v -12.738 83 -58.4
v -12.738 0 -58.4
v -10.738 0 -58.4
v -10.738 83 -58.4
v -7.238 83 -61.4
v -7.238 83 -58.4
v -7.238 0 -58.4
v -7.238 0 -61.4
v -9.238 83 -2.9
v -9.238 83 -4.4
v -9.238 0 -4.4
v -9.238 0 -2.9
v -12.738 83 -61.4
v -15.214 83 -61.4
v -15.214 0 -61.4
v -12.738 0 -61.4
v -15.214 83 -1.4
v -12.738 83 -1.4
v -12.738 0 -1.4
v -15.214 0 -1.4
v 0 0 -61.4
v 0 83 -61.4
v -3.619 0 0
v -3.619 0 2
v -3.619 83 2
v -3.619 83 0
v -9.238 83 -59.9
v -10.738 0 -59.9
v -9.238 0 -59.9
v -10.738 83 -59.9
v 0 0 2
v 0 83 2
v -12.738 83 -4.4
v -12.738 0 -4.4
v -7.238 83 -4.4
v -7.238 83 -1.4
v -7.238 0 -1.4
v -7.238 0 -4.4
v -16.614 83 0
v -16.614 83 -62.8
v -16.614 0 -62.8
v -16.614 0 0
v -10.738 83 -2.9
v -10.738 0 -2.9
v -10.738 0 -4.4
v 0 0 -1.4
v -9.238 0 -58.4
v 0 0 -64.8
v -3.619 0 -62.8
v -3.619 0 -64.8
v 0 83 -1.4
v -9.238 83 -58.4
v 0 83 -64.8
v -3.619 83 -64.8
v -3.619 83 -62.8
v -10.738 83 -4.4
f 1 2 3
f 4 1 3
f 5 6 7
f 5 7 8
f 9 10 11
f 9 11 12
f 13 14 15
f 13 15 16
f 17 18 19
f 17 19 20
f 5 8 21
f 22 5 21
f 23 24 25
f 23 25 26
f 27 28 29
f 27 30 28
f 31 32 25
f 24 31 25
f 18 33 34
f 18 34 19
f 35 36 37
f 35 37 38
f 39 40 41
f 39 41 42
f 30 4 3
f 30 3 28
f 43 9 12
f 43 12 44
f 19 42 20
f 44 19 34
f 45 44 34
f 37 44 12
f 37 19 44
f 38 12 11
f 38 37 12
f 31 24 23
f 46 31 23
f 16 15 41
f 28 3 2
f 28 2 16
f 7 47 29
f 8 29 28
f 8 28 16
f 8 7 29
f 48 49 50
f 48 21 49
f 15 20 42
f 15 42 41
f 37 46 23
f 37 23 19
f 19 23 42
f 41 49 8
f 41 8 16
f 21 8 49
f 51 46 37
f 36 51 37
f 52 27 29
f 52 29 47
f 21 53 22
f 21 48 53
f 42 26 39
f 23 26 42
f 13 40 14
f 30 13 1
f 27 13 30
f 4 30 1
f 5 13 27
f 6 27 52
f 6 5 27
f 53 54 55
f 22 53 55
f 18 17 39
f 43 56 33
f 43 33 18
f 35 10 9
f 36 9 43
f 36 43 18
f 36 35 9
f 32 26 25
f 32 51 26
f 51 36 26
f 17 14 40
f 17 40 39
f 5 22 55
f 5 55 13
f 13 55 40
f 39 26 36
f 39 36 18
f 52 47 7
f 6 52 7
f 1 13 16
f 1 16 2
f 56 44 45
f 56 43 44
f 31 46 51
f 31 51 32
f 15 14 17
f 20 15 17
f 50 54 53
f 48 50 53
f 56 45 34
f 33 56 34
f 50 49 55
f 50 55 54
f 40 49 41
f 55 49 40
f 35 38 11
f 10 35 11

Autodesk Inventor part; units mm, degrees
ref_plane "YZ Plane" through (0, 0, 0) normal (1, 0, 0) x (0, 1, 0)
ref_plane "XZ Plane" through (0, 0, 0) normal (0, 1, 0) x (-1, 0, 0)
sketch "Sketch1" plane through (0, 0, 0) normal (0, 1, 0) x (-1, 0, 0)
  line L0 (0, 0) -> (21.668, 0)
  line L1 (21.668, 0) -> (21.668, -61.4)
  line L2 (21.668, -61.4) -> (0, -61.4)
  line L3 (0, -61.4) -> (0, 0)
  dimension "d0" = 21.668
  dimension "d1" = 61.4
extrude "Extrusion1" add sketch "Sketch1" along normal blind 83
sketch "Sketch2" plane through (0, 83, 0) normal (0, 1, 0) x (1, 0, 0)
  line L0 (0, 0) -> (0, 1.4)
  line L1 (0, 0) -> (0, 61.4) projected
  line L2 (0, 1.4) -> (-20.268, 1.4)
  line L3 (-21.668, 61.4) -> (-21.668, 0) projected
  line L4 (-20.268, 1.4) -> (-20.268, 61.4)
  line L5 (0, 61.4) -> (-21.668, 61.4) projected
  line L6 (-20.268, 61.4) -> (0, 61.4)
  line L7 (0, 61.4) -> (0, 1.4)
  line L8 (-21.668, 61.4) -> (0, 61.4)
  line L9 (0, 61.4) -> (0, 62.8)
  line L10 (0, 62.8) -> (-21.668, 62.8)
  line L11 (-21.668, 62.8) -> (-21.668, 61.4)
  dimension "d4" = 1.4
  dimension "d5" = 20.268
  dimension "d6" = 1.4
extrude "Extrusion2" add sketch "Sketch2" against normal blind 83 contours L5 L11 L10 L9
sketch "Sketch3" plane through (0, 83, 0) normal (0, 1, 0) x (1, 0, 0)
  line L0 (0, 0) -> (0, 62.8) projected
  line L1 (0, 0) -> (0, 1.4)
  line L2 (0, 1.4) -> (-20.268, 1.4)
  line L3 (-20.268, 1.4) -> (-20.268, 61.4)
  line L4 (-21.668, 62.8) -> (-21.668, 0) projected
  line L5 (-20.268, 61.4) -> (0, 61.4)
  dimension "d9" = 1.4
  dimension "d10" = 20.268
  dimension "d11" = 60
extrude "Extrusion3" cut sketch "Sketch3" against normal blind 129.5
sketch "Sketch4" plane through (0, 83, 0) normal (0, 1, 0) x (1, 0, 0)
  line L0 (0, 0) -> (0, 1.4) projected
  line L1 (0, 0) -> (0, -2)
  line L2 (0, -2) -> (-3.619, -2)
  line L3 (-20.268, 1.4) -> (0, 1.4) projected
  line L4 (-3.619, -2) -> (-3.619, 0)
  line L5 (-21.668, 0) -> (0, 0) projected
  line L6 (-3.619, 0) -> (-7.238, 0)
  line L7 (-7.238, 0) -> (-7.238, 1.4)
  line L8 (-7.238, 1.4) -> (-7.238, 4.4)
  line L9 (-7.238, 4.4) -> (-9.238, 4.4)
  line L10 (-9.238, 4.4) -> (-9.238, 2.9)
  line L11 (-9.238, 2.9) -> (-10.738, 2.9)
  line L12 (-10.738, 2.9) -> (-10.738, 4.4)
  line L13 (-10.738, 4.4) -> (-12.738, 4.4)
  line L14 (-12.738, 4.4) -> (-12.738, 1.4)
  dimension "d14" = 2
  dimension "d15" = 3.619
  dimension "d16" = 3.619
  dimension "d17" = 3
  dimension "d18" = 2
  dimension "d19" = 1.5
  dimension "d20" = 1.5
  dimension "d21" = 2
extrude "Extrusion4" add sketch "Sketch4" against normal blind 83 contours L3 L14 L13 L12 L11 L10 L9 L8 | L1 L2 L4 L5
ref_plane "Work Plane1" through (0, 0, -31.4) normal (0, 0, 1) x (1, 0, 0)
mirror "Mirror1" about plane through (0, 0, -31.4) normal (0, 0, 1) of "Extrusion4"
sketch "Sketch5" plane through (-21.668, 0, 0) normal (-1, 0, 0) x (0, 0, 1)
  line L0 (-62.8, 83) -> (-62.8, 0) projected
  line L1 (0, 0) -> (-62.8, 0)
  line L2 (-62.8, 0) -> (-62.8, 83)
  line L3 (-62.8, 83) -> (0, 83)
  line L4 (0, 83) -> (0, 0)
extrude "Extrusion5" cut sketch "Sketch5" against normal blind 6.454
sketch "Sketch6" plane through (-15.214, 0, 0) normal (-1, 0, 0) x (0, 0, 1)
  line L0 (2, 0) -> (0, 0) projected
  line L1 (-62.8, 83) -> (-61.4, 83) projected
  line L2 (0, 0) -> (-62.8, 0)
  line L3 (-62.8, 0) -> (-62.8, 83)
  line L4 (-62.8, 83) -> (0, 83)
  line L5 (0, 83) -> (0, 0)
extrude "Extrusion6" add sketch "Sketch6" along normal blind 1.4
properties part number "kabza başlık"
